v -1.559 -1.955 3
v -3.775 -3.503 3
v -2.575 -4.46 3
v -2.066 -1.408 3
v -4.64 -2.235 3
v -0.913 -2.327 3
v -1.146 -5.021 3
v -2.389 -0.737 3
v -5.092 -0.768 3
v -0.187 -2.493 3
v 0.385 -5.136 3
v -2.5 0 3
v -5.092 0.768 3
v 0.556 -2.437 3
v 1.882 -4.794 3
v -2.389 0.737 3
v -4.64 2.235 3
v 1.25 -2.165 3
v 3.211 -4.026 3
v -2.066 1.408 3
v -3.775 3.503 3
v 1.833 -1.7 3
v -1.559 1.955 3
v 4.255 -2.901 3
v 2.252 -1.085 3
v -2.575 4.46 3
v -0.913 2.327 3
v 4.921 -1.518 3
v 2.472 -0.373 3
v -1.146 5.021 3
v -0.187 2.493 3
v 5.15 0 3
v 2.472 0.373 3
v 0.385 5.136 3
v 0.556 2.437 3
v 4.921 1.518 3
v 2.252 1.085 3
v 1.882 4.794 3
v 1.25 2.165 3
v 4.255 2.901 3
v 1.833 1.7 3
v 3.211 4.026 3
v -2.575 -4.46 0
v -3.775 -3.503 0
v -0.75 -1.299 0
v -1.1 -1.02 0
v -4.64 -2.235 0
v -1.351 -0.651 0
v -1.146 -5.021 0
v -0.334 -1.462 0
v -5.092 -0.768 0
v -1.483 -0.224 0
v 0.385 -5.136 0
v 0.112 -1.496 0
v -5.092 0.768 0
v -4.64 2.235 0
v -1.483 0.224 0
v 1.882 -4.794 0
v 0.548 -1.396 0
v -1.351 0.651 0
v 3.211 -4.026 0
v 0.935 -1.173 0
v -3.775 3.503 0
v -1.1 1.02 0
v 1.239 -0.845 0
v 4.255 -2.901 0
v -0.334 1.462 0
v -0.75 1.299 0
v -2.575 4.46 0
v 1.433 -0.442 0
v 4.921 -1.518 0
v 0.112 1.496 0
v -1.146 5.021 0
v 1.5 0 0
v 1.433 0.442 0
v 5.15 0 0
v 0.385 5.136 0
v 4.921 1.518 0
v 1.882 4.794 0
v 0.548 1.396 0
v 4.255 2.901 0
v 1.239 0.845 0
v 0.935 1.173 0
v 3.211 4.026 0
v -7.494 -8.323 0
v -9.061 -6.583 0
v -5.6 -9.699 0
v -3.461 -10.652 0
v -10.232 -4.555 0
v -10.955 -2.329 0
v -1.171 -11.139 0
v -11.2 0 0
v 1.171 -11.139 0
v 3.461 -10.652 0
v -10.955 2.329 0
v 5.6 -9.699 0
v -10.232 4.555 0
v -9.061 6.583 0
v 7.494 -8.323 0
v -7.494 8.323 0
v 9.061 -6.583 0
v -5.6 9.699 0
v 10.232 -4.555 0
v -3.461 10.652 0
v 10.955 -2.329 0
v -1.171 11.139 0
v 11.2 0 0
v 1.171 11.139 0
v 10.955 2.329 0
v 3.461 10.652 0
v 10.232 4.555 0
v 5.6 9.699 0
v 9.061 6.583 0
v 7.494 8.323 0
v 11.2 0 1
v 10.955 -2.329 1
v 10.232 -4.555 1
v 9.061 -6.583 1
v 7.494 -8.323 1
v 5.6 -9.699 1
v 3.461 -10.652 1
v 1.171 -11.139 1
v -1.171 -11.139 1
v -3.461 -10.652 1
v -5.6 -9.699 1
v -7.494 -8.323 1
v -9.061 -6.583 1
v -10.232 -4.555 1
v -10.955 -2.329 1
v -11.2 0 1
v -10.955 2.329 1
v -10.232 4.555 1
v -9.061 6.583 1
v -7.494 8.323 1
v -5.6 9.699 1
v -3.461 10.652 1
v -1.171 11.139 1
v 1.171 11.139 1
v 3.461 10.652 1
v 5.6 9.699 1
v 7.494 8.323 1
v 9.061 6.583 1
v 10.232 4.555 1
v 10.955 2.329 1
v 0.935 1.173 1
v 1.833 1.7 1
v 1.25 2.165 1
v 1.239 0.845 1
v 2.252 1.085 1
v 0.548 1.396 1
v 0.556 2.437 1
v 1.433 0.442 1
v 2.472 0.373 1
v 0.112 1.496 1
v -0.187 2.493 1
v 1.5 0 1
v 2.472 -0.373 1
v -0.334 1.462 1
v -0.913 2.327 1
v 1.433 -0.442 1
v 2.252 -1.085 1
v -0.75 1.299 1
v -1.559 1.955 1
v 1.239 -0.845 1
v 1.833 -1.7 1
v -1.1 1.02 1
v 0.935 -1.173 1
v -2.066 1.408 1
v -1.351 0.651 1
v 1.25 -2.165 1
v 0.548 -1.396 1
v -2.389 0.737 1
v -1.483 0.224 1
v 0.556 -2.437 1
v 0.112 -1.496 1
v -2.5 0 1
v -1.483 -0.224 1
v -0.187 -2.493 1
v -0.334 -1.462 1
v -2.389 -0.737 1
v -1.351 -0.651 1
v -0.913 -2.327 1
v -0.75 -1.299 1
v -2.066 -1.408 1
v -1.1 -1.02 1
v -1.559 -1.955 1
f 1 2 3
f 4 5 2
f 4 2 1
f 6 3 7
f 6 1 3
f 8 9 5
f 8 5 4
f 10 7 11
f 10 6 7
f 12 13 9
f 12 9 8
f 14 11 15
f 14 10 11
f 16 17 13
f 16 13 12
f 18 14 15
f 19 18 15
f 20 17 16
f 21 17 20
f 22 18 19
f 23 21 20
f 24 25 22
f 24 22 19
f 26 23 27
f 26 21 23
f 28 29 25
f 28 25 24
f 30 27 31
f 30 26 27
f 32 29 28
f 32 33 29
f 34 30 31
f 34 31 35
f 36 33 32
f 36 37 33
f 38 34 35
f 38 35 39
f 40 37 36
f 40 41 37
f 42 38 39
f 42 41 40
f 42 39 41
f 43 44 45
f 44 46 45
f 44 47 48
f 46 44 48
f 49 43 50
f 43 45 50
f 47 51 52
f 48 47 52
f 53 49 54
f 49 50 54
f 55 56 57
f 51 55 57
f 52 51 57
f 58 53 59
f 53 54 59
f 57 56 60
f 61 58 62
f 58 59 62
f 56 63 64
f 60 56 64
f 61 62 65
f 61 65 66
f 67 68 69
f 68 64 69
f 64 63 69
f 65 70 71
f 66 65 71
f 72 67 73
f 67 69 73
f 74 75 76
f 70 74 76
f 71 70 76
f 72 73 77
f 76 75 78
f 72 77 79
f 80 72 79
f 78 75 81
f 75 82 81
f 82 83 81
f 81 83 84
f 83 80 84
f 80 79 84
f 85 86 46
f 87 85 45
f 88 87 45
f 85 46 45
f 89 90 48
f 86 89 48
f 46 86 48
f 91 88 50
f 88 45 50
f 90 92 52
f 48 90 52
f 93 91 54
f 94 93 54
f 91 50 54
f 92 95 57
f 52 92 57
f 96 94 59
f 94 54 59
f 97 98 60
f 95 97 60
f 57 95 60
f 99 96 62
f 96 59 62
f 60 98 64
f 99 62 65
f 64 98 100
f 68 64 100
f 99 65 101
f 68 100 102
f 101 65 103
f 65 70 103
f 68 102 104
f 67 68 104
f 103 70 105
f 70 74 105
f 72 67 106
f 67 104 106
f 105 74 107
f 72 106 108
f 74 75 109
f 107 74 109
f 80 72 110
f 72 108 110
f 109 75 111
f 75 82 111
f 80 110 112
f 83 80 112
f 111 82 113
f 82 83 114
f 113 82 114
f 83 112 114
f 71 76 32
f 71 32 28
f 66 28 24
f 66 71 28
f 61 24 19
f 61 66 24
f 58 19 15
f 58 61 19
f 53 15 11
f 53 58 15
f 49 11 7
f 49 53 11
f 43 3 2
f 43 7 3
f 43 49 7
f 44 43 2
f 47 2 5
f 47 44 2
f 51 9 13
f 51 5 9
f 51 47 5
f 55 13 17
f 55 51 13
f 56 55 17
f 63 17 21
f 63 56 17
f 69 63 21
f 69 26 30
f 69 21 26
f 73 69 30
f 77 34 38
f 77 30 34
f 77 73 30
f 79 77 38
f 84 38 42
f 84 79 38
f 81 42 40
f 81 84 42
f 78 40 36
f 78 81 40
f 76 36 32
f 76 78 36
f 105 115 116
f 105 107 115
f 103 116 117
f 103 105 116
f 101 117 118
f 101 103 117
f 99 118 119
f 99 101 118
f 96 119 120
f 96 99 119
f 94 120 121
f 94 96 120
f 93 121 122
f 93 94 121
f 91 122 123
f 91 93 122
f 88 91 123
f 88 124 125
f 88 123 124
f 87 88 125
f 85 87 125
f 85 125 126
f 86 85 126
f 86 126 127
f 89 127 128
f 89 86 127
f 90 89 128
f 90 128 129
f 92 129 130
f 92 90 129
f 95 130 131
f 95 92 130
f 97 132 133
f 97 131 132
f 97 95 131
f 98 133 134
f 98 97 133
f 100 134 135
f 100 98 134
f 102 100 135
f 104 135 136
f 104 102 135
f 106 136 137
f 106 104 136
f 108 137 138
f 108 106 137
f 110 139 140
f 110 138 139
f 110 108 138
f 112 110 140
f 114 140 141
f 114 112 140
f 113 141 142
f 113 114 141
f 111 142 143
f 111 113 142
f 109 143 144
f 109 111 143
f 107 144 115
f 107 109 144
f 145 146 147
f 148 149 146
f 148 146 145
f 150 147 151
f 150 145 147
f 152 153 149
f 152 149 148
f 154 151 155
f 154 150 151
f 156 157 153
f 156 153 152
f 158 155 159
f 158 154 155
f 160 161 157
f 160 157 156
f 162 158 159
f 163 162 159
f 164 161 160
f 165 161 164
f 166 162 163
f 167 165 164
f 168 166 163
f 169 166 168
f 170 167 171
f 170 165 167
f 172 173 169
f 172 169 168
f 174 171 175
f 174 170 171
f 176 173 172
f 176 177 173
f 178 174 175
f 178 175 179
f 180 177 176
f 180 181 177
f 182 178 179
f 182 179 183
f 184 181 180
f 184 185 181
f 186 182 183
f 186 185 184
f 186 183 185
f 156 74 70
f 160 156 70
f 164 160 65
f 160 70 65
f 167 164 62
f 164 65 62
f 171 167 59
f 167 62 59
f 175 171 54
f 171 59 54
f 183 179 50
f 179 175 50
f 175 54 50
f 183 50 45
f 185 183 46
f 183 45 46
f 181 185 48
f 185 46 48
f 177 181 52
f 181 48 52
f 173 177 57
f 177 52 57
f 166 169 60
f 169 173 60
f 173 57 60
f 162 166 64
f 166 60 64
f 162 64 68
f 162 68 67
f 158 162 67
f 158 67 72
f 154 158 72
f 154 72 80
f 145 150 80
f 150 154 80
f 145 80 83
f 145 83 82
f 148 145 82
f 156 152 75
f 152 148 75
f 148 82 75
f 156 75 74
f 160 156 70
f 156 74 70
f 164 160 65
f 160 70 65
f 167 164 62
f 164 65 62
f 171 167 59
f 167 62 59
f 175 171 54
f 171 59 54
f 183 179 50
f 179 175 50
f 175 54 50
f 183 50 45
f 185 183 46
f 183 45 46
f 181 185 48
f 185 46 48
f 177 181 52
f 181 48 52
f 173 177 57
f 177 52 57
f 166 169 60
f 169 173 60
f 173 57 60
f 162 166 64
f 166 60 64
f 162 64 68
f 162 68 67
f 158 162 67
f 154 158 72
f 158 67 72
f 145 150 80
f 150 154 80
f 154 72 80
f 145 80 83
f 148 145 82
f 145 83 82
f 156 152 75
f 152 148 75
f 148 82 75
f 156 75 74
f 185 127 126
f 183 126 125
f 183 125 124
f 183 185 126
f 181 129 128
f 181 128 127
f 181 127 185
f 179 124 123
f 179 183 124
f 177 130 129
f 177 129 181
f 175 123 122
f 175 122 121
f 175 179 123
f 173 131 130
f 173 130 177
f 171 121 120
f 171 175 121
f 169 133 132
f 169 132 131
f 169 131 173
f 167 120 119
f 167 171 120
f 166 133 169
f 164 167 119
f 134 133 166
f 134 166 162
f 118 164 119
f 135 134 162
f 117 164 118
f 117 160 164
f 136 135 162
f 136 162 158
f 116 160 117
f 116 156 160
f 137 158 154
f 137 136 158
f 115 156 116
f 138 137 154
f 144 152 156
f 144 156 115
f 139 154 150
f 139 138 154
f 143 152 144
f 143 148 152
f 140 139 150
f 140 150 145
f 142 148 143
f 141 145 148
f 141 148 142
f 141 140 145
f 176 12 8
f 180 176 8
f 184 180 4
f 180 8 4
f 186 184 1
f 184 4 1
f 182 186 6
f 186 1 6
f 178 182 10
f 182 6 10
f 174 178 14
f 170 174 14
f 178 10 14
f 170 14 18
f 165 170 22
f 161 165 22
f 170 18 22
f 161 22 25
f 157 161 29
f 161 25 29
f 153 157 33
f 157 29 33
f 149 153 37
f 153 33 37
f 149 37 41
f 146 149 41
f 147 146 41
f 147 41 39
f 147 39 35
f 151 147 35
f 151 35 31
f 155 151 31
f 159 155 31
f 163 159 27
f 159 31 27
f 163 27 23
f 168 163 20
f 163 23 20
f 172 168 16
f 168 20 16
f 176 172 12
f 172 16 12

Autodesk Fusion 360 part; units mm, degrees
sketch "Sketch1" plane through (0, 0, 0) normal (0, 0, 1) x (1, 0, 0)
  circle A0 centre (0, 0) radius 11.2
  circle A1 centre (0, 0) radius 5.15
  circle A2 centre (0, 0) radius 1.5
  dimension "d1" = 22.4
  dimension "d2" = 10.3
  dimension "d3" = 3
extrude "Extrude1" add sketch "Sketch1" along normal blind 1 contours A0 | A1 makes body 1
extrude "Extrude2" add sketch "Sketch1" along normal blind 3 separate body contours A1 makes body 2
sketch "Sketch2" plane through (0, 0, 3) normal (0, 0, 1) x (-1, 0, 0)
  circle A0 centre (0, 0) radius 1.5
  circle A1 centre (0, 0) radius 5.15
  circle A2 centre (0, 0) radius 2.5
  dimension "d8" = 5
extrude "Extrude3" cut sketch "Sketch2" against normal blind 2 contours A2 bodies 2
